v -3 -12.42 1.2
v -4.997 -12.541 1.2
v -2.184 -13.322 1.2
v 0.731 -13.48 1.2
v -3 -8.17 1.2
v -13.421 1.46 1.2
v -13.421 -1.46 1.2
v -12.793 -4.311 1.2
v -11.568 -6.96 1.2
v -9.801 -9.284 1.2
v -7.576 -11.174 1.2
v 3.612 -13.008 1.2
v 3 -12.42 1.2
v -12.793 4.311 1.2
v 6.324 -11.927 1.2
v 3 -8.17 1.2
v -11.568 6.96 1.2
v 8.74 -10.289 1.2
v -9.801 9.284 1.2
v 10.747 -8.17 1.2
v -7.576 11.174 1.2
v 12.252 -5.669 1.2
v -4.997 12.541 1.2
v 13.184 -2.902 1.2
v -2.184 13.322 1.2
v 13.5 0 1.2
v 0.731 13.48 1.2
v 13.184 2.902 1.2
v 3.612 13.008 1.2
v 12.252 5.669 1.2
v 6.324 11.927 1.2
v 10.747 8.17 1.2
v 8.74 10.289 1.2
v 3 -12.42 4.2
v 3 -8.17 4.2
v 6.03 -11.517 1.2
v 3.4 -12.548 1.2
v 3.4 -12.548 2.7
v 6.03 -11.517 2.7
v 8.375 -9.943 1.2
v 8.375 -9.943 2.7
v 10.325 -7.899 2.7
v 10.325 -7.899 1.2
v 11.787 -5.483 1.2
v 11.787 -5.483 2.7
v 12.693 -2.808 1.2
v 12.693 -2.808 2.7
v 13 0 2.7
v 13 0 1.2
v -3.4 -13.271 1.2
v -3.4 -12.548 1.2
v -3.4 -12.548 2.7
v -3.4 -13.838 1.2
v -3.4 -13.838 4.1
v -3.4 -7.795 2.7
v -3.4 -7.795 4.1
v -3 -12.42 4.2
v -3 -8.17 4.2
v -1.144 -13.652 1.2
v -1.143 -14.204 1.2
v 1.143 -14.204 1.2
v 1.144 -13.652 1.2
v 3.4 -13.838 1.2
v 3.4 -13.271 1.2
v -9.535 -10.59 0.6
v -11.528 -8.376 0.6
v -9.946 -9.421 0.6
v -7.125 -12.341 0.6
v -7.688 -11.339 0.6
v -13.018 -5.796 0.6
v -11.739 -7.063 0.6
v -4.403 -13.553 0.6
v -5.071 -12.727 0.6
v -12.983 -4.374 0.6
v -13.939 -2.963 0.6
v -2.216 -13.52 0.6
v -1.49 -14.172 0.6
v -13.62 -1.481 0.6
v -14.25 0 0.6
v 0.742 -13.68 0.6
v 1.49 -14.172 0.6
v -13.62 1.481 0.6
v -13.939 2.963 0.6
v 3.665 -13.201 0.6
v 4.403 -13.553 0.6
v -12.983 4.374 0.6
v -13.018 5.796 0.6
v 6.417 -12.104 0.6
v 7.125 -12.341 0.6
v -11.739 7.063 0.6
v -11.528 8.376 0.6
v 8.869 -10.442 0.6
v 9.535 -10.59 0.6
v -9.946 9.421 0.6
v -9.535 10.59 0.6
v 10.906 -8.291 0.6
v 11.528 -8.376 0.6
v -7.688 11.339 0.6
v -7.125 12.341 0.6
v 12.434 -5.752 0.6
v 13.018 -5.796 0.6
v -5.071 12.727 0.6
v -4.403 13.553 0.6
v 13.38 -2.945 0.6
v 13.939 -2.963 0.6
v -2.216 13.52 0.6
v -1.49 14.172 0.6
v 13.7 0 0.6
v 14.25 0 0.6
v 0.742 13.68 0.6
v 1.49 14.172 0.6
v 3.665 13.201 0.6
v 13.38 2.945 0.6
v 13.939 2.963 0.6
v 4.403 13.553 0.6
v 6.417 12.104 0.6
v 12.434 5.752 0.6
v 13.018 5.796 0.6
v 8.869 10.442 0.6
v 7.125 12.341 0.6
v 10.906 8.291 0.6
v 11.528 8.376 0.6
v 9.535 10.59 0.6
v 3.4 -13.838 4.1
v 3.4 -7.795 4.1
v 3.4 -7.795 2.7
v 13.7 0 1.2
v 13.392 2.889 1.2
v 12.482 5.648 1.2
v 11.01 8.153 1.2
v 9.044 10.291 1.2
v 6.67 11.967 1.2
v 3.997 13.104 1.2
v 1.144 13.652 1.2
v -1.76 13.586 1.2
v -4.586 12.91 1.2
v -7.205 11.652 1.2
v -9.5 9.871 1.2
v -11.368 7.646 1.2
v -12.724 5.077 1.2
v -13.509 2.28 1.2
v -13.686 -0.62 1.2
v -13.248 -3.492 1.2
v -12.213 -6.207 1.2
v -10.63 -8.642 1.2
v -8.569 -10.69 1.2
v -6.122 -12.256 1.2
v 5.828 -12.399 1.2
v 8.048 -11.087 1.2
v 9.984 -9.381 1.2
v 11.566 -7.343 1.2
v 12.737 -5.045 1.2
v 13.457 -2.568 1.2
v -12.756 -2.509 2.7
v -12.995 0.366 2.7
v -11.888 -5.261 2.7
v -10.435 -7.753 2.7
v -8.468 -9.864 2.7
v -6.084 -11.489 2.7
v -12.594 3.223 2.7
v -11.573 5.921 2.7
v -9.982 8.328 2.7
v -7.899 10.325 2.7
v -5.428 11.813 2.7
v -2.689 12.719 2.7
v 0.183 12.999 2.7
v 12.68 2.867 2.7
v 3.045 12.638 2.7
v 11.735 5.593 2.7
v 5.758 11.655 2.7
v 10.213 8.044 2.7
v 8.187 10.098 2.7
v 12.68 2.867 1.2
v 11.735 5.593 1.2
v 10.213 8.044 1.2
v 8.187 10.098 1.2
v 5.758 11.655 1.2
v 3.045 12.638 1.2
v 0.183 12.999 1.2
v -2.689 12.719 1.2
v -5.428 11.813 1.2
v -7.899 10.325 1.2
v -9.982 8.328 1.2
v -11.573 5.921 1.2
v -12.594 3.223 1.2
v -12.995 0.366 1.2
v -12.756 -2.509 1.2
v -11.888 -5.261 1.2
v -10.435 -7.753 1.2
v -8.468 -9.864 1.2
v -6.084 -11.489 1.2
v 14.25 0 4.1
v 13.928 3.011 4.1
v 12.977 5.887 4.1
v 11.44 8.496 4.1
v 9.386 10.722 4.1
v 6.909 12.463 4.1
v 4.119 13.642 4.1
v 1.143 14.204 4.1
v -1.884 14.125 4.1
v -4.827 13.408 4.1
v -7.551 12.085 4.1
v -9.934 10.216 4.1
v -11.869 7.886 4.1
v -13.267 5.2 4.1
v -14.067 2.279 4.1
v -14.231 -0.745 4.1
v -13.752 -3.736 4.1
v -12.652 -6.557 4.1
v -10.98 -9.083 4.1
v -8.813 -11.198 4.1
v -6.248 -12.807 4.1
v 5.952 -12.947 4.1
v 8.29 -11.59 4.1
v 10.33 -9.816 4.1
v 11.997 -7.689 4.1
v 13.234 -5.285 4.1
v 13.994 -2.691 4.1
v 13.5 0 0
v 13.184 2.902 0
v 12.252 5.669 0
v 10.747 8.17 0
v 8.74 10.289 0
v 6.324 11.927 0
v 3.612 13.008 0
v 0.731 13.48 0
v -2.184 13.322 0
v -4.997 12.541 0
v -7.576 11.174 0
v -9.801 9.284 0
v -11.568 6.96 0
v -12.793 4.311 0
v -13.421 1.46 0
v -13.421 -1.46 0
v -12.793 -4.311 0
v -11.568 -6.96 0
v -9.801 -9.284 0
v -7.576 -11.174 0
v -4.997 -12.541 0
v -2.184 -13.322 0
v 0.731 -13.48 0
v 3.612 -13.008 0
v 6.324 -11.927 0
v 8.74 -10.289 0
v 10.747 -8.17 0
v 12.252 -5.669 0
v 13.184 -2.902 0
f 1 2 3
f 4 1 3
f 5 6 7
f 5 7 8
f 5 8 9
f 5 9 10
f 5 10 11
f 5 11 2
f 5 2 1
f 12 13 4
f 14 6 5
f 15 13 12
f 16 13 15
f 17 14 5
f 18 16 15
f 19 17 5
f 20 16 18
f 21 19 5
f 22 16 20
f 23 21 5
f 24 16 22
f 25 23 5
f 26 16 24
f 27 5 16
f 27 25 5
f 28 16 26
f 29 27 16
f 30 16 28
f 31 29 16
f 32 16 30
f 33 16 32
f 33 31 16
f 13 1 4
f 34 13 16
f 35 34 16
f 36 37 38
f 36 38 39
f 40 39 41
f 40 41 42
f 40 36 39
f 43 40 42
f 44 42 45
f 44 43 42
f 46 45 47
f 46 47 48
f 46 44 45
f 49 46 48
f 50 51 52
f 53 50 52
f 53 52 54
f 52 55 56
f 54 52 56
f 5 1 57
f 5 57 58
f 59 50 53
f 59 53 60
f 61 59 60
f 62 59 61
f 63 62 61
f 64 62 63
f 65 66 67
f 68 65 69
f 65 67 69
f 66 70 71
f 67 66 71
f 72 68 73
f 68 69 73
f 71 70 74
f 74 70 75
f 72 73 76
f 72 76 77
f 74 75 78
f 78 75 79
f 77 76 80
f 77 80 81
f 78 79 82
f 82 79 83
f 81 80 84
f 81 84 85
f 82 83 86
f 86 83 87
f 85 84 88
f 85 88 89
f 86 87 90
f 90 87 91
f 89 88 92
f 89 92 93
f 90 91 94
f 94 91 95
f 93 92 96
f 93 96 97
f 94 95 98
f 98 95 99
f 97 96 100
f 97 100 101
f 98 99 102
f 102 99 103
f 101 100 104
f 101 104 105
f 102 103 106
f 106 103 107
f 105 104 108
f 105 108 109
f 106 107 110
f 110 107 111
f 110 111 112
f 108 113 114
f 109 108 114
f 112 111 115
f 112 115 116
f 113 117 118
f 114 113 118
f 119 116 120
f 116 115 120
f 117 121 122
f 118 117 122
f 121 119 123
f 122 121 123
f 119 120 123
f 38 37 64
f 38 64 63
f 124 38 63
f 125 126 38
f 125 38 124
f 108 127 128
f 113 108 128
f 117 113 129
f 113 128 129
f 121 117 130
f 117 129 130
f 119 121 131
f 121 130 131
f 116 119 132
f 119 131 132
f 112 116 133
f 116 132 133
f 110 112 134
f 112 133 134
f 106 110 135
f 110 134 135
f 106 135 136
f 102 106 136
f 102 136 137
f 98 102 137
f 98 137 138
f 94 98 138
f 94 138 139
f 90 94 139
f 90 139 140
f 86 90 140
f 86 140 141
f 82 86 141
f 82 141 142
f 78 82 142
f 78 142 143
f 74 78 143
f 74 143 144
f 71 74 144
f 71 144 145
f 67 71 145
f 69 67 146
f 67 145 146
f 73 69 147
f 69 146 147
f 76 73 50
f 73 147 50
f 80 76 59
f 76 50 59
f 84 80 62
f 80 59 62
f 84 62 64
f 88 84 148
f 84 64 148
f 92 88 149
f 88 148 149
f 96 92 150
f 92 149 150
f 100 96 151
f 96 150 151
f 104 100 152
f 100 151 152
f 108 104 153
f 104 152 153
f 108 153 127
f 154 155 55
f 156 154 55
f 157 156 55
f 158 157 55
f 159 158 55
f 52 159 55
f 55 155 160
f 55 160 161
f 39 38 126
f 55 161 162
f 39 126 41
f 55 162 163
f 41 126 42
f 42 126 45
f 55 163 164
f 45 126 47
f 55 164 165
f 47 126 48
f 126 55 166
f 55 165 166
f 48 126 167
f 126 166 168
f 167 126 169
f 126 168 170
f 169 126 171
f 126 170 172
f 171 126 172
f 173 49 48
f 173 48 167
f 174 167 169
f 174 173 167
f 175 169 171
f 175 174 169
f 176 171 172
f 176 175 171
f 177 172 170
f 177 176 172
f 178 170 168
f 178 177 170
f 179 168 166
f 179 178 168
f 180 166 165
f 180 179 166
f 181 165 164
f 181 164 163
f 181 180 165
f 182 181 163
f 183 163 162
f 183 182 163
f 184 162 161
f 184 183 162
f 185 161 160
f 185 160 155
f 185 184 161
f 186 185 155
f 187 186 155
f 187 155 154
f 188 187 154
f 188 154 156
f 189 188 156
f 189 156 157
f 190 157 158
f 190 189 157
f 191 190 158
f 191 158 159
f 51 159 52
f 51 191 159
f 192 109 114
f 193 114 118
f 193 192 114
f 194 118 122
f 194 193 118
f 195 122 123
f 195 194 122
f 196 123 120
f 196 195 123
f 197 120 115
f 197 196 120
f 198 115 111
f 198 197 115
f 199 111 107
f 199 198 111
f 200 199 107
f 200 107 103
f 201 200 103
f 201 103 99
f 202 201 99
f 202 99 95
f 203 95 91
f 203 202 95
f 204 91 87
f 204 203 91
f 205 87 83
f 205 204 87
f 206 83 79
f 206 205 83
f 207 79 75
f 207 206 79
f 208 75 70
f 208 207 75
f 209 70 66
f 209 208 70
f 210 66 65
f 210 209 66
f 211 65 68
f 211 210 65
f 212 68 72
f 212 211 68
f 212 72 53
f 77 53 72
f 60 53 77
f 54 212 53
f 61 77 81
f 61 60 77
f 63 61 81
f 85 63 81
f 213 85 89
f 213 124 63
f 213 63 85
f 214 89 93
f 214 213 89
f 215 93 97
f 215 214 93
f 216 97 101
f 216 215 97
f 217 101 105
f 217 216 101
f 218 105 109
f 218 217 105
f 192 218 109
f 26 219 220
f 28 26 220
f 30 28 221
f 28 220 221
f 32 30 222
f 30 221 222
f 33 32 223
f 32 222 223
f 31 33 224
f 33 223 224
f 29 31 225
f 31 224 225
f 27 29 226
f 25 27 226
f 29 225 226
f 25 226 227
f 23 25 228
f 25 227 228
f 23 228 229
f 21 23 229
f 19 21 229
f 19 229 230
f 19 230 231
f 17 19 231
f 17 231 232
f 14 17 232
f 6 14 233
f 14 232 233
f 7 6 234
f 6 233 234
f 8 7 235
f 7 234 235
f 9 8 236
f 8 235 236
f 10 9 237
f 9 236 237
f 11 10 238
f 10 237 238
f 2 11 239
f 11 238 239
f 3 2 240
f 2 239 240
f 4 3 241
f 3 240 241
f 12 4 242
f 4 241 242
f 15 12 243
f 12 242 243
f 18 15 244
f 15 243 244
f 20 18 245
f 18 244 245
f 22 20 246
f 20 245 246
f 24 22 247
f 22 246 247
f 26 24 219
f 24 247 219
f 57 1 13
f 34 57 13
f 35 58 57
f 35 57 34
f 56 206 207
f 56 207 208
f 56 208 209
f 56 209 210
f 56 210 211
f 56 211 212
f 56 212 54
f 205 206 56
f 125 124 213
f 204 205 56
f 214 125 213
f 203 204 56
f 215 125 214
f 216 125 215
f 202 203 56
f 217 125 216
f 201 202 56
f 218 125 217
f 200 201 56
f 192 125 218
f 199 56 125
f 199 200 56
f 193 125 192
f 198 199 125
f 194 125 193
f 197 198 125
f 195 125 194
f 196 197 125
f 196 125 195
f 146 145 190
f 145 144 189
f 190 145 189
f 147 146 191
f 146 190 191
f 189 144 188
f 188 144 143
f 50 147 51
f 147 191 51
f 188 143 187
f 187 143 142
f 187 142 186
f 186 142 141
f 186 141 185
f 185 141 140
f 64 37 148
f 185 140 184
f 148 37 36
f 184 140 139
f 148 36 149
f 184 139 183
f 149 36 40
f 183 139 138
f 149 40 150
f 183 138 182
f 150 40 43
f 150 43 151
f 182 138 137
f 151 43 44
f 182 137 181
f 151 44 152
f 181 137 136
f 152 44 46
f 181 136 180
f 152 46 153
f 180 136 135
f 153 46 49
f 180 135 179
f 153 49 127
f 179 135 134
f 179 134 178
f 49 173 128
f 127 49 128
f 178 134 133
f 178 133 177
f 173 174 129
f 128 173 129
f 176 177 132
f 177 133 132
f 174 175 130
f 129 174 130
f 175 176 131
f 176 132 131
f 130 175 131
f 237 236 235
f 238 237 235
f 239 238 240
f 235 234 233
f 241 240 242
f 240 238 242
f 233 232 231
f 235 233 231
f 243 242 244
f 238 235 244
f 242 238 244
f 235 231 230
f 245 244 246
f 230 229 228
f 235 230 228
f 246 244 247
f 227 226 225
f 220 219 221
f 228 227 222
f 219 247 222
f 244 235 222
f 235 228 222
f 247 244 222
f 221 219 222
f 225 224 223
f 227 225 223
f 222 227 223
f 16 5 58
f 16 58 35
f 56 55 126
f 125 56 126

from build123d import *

# Parameters (mm, degrees)
F0_R     = 13.5
F0_W     = 6
F0_H     = 4.25
F1_DEPTH = 1.2
F2_DEPTH = 4.2
F3_R     = 14.25
F3_R_2   = 13.7
F3_R_3   = 13.5
F4_DEPTH = 2.9
F5_DEPTH = 0.6
F3_W     = 6
F3_H     = 4.25
F6_DEPTH = 1.5
F7_W     = 6.8
F7_H     = 3
F8_DEPTH = 8


with BuildPart() as f1:
    # F0 (on Top) → F1 (new body)
    with BuildSketch(Plane.XY):
        Circle(F0_R)
        with Locations((0, -10.295)):
            Rectangle(F0_W, F0_H, mode=Mode.SUBTRACT)
        with Locations((0, -10.295)):
            Rectangle(F0_W, F0_H)
    extrude(amount=F1_DEPTH)

    # F0 (on Top) → F2 (join)
    with BuildSketch(Plane.XY):
        with Locations((0, -10.295)):
            Rectangle(F0_W, F0_H)
    extrude(amount=F2_DEPTH)


with BuildPart() as f4:
    # F3 (on face) → F4 (new body)
    with BuildSketch(Plane.XY.offset(1.2)):
        Circle(F3_R)
        Circle(F3_R_2, mode=Mode.SUBTRACT)
        Circle(F3_R_2)
        Circle(F3_R_3, mode=Mode.SUBTRACT)
        Circle(F3_R_3)
        with BuildLine():
            Line((3.4, -12.5475097131), (3.4, -12.795))
            Line((3.4, -12.795), (2.2995597405, -12.795))
            ThreePointArc((2.2995597405, -12.795), (0, -13), (-2.2995597405, -12.795))
            Line((-2.2995597405, -12.795), (-3.4, -12.795))
            Line((-3.4, -12.795), (-3.4, -12.5475097131))
            ThreePointArc((-3.4, -12.5475097131), (-7.8993670633, 10.3247275993), (13, 0))
            ThreePointArc((13, 0), (10.3247275993, -7.8993670633), (3.4, -12.5475097131))
        make_face(mode=Mode.SUBTRACT)
        with BuildLine():
            Line((3.4, -7.795), (3.4, -12.5475097131))
            ThreePointArc((3.4, -12.5475097131), (10.3247275993, -7.8993670633), (13, 0))
            ThreePointArc((13, 0), (-7.8993670633, 10.3247275993), (-3.4, -12.5475097131))
            Line((-3.4, -12.5475097131), (-3.4, -7.795))
            Line((-3.4, -7.795), (3.4, -7.795))
        make_face()
        with BuildLine():
            ThreePointArc((-2.2995597405, -12.795), (0, -13), (2.2995597405, -12.795))
            Line((2.2995597405, -12.795), (-2.2995597405, -12.795))
        make_face()
    extrude(amount=F4_DEPTH)

    # F3 (on face) → F5 (join)
    with BuildSketch(Plane.XY.offset(1.2)):
        Circle(F3_R)
        Circle(F3_R_2, mode=Mode.SUBTRACT)
    extrude(amount=-F5_DEPTH)

    # F3 (on face) → F6 (cut)
    with BuildSketch(Plane.XY.offset(1.2)):
        with BuildLine():
            Line((3.4, -7.795), (3.4, -12.5475097131))
            ThreePointArc((3.4, -12.5475097131), (10.3247275993, -7.8993670633), (13, 0))
            ThreePointArc((13, 0), (-7.8993670633, 10.3247275993), (-3.4, -12.5475097131))
            Line((-3.4, -12.5475097131), (-3.4, -7.795))
            Line((-3.4, -7.795), (3.4, -7.795))
        make_face()
        with BuildLine():
            Line((-2.2995597405, -12.795), (2.2995597405, -12.795))
            ThreePointArc((2.2995597405, -12.795), (2.8524652793, -12.6831952532), (3.4, -12.5475097131))
            Line((3.4, -12.5475097131), (3.4, -7.795))
            Line((3.4, -7.795), (-3.4, -7.795))
            Line((-3.4, -7.795), (-3.4, -12.5475097131))
            ThreePointArc((-3.4, -12.5475097131), (-2.8524652793, -12.6831952532), (-2.2995597405, -12.795))
        make_face()
        with Locations((0, -10.295)):
            Rectangle(F3_W, F3_H, mode=Mode.SUBTRACT)
        with BuildLine():
            ThreePointArc((-2.2995597405, -12.795), (0, -13), (2.2995597405, -12.795))
            Line((2.2995597405, -12.795), (-2.2995597405, -12.795))
        make_face()
    extrude(amount=F6_DEPTH, mode=Mode.SUBTRACT)

    # F7 (on face) → F8 (cut)
    with BuildSketch(Plane.XZ.offset(12.42)):
        with Locations((0, 2.7)):
            Rectangle(F7_W, F7_H)
    extrude(amount=F8_DEPTH, mode=Mode.SUBTRACT)


solid = Compound([f1.part, f4.part])
